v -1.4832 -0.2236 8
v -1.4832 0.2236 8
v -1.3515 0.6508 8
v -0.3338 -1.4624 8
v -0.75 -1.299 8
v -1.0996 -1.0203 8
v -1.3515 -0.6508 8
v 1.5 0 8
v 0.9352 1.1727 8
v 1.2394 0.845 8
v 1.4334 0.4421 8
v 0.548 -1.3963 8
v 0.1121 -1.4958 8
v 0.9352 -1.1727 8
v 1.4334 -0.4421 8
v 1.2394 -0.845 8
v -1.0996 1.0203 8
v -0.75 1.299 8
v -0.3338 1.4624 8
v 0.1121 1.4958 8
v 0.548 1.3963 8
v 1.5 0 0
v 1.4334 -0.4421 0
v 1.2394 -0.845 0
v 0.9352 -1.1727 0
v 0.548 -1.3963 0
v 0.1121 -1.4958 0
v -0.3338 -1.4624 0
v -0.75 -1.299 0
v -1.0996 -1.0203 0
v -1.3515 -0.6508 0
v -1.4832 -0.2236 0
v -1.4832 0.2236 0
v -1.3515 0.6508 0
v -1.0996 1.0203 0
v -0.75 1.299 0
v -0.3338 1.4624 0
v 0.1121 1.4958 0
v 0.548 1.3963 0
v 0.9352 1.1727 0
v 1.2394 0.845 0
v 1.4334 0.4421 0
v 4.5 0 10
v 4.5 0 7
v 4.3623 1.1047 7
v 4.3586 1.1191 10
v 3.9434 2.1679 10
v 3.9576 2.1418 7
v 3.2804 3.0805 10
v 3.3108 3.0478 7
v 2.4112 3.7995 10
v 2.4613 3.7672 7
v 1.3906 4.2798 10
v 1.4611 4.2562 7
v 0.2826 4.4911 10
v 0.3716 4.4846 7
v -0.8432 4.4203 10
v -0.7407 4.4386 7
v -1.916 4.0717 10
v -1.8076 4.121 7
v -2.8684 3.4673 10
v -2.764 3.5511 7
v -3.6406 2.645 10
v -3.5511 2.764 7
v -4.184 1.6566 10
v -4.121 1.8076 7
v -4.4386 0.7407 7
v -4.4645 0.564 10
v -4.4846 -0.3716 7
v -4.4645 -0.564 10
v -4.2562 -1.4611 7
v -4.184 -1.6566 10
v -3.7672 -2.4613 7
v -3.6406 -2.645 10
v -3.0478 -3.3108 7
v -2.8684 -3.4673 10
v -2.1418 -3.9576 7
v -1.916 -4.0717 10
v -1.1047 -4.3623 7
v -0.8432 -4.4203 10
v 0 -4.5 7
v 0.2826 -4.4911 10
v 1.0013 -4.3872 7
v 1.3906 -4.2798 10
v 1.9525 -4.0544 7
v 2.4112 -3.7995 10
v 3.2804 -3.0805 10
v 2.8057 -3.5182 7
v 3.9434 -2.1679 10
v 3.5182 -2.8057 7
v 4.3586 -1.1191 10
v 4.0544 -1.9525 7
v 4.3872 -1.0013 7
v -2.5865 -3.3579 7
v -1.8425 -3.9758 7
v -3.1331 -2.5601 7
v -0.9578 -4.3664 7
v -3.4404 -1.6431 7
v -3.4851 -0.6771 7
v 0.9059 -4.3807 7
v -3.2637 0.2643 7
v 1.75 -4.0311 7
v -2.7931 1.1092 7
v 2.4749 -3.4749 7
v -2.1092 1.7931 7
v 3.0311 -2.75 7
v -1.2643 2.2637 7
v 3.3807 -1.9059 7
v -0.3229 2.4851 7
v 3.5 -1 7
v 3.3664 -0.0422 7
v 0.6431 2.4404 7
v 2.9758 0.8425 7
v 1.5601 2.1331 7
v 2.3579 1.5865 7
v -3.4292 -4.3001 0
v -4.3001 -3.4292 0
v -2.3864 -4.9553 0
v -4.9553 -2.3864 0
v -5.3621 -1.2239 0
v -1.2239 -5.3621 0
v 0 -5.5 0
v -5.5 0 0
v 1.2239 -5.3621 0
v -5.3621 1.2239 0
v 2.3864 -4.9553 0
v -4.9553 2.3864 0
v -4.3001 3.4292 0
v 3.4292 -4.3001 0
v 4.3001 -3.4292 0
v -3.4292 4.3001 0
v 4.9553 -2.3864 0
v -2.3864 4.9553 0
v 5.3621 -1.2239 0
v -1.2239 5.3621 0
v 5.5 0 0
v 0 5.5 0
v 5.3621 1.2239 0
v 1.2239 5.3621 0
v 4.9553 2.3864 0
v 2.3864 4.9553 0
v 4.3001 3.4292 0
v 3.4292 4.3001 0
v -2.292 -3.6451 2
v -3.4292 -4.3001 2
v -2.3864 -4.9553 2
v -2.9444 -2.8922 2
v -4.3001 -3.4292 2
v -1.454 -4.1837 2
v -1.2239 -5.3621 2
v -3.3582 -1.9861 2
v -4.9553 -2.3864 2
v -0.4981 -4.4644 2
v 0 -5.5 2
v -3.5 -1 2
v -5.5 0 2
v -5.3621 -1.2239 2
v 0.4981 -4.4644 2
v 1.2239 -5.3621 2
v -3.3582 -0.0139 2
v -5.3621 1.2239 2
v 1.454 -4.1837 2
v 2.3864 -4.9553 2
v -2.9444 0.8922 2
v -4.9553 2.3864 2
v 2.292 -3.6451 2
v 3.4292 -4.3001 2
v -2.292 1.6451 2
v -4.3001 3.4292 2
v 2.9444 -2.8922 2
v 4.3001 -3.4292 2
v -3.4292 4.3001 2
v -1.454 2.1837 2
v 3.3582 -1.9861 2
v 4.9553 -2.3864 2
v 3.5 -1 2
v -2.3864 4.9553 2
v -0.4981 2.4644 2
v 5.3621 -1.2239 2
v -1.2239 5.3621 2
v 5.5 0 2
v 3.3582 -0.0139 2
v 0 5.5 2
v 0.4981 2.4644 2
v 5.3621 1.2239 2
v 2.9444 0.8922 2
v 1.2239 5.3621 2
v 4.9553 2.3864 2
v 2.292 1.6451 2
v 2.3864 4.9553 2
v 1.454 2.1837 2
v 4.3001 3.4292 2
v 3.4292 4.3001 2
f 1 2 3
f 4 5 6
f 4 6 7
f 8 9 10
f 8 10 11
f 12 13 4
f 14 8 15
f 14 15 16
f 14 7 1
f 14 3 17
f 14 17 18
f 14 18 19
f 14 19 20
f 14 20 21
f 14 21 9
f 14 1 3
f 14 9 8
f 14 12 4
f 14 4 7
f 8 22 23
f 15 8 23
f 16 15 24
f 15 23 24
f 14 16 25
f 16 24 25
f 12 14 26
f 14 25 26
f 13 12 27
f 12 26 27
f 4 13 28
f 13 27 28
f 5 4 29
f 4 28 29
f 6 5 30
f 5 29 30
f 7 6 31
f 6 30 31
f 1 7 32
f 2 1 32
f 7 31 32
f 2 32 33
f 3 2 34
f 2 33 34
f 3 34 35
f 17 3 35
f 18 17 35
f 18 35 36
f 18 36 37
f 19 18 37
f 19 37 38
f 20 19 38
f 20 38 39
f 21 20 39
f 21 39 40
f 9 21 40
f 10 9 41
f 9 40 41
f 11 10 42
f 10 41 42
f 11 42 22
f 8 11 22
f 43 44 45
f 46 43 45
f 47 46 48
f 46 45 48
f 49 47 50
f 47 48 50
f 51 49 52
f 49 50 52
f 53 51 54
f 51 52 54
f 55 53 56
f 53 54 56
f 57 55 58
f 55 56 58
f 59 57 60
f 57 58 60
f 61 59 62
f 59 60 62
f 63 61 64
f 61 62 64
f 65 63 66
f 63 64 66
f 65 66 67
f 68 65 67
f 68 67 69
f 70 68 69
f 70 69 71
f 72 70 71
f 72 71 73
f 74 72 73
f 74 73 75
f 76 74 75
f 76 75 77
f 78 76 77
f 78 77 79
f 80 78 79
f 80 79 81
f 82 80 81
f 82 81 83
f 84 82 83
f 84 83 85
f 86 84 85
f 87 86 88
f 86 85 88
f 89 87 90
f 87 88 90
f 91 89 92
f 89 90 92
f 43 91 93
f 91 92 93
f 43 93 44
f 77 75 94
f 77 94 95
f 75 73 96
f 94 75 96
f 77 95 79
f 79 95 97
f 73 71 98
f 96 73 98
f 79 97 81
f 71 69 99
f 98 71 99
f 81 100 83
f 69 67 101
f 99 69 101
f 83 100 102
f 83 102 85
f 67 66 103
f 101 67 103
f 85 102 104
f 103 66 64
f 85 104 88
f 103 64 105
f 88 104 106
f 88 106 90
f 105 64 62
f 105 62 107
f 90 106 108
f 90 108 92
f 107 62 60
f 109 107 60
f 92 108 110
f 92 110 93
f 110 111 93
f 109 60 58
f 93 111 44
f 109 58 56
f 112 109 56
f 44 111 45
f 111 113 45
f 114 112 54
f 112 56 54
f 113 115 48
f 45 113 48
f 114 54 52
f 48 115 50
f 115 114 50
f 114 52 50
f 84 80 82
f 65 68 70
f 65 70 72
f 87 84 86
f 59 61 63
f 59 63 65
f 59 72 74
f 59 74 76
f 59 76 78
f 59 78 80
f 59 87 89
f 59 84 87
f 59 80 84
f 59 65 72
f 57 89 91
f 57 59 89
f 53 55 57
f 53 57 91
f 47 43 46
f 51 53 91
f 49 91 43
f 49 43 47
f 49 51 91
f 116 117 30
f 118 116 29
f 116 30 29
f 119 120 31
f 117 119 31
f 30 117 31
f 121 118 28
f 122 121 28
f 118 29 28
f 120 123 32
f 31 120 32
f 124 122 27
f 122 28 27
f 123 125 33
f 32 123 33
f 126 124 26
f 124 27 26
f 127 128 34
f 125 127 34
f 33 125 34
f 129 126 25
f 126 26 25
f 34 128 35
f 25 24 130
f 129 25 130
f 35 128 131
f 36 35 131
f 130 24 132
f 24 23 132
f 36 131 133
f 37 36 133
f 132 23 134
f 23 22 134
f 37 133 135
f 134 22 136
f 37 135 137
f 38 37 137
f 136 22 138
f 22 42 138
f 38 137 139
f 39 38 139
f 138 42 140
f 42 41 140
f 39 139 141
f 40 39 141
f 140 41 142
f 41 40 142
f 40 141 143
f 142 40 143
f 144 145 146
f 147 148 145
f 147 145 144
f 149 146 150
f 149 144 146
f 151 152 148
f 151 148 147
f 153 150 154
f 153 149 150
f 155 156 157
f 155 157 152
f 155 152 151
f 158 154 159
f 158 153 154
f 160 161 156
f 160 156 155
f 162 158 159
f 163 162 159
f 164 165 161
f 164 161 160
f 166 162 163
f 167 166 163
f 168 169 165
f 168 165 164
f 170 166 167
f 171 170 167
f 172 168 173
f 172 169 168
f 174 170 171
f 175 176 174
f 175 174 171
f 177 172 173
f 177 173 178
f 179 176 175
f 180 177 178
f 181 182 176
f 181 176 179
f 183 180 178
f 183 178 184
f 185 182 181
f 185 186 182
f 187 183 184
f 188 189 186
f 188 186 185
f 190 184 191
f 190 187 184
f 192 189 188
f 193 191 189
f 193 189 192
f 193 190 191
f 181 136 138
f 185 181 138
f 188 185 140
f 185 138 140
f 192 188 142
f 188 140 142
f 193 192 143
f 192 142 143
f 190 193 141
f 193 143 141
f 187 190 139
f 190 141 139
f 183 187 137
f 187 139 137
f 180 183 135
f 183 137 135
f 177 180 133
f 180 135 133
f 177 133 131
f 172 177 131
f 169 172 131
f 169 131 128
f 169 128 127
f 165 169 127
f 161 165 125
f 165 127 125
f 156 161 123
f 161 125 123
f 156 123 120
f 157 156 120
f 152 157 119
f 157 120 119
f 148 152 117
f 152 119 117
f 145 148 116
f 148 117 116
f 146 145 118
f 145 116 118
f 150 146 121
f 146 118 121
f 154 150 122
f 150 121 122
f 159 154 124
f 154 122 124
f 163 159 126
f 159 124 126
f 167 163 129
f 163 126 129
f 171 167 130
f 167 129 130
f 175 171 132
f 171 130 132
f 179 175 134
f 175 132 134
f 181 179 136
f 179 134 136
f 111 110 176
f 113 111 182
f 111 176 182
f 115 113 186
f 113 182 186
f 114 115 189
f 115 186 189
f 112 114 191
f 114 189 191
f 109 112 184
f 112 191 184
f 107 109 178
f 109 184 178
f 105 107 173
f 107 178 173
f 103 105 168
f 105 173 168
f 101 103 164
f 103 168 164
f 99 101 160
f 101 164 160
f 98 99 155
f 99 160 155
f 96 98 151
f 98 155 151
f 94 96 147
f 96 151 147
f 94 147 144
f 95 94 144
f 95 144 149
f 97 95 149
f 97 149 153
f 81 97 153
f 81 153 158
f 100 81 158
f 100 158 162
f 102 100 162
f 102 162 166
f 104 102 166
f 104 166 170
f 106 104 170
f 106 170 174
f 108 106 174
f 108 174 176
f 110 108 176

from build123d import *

# Parameters (mm, degrees)
F0_R     = 5.5
F1_DEPTH = 2
F2_R     = 3.5
F3_DEPTH = 5
F4_R     = 4.5
F5_DEPTH = 3
F6_R     = 1.5
F7_DEPTH = 8


with BuildPart() as f1:
    # F0 (on Top) → F1 (new body)
    with BuildSketch(Plane.XY):
        Circle(F0_R)
    extrude(amount=F1_DEPTH)

    # F2 (on face) → F3 (join)
    with BuildSketch(Plane.XY.offset(2)):
        with Locations((0, -1)):
            Circle(F2_R)
    extrude(amount=F3_DEPTH)

    # F4 (on face) → F5 (join)
    with BuildSketch(Plane.XY.offset(7)):
        Circle(F4_R)
    extrude(amount=F5_DEPTH)

    # F6 (on face) → F7 (cut)
    with BuildSketch(Plane(origin=(0, 0, 0), x_dir=(1, 0, 0), z_dir=(0, 0, -1))):
        Circle(F6_R)
    extrude(amount=-F7_DEPTH, mode=Mode.SUBTRACT)


solid = f1.part
